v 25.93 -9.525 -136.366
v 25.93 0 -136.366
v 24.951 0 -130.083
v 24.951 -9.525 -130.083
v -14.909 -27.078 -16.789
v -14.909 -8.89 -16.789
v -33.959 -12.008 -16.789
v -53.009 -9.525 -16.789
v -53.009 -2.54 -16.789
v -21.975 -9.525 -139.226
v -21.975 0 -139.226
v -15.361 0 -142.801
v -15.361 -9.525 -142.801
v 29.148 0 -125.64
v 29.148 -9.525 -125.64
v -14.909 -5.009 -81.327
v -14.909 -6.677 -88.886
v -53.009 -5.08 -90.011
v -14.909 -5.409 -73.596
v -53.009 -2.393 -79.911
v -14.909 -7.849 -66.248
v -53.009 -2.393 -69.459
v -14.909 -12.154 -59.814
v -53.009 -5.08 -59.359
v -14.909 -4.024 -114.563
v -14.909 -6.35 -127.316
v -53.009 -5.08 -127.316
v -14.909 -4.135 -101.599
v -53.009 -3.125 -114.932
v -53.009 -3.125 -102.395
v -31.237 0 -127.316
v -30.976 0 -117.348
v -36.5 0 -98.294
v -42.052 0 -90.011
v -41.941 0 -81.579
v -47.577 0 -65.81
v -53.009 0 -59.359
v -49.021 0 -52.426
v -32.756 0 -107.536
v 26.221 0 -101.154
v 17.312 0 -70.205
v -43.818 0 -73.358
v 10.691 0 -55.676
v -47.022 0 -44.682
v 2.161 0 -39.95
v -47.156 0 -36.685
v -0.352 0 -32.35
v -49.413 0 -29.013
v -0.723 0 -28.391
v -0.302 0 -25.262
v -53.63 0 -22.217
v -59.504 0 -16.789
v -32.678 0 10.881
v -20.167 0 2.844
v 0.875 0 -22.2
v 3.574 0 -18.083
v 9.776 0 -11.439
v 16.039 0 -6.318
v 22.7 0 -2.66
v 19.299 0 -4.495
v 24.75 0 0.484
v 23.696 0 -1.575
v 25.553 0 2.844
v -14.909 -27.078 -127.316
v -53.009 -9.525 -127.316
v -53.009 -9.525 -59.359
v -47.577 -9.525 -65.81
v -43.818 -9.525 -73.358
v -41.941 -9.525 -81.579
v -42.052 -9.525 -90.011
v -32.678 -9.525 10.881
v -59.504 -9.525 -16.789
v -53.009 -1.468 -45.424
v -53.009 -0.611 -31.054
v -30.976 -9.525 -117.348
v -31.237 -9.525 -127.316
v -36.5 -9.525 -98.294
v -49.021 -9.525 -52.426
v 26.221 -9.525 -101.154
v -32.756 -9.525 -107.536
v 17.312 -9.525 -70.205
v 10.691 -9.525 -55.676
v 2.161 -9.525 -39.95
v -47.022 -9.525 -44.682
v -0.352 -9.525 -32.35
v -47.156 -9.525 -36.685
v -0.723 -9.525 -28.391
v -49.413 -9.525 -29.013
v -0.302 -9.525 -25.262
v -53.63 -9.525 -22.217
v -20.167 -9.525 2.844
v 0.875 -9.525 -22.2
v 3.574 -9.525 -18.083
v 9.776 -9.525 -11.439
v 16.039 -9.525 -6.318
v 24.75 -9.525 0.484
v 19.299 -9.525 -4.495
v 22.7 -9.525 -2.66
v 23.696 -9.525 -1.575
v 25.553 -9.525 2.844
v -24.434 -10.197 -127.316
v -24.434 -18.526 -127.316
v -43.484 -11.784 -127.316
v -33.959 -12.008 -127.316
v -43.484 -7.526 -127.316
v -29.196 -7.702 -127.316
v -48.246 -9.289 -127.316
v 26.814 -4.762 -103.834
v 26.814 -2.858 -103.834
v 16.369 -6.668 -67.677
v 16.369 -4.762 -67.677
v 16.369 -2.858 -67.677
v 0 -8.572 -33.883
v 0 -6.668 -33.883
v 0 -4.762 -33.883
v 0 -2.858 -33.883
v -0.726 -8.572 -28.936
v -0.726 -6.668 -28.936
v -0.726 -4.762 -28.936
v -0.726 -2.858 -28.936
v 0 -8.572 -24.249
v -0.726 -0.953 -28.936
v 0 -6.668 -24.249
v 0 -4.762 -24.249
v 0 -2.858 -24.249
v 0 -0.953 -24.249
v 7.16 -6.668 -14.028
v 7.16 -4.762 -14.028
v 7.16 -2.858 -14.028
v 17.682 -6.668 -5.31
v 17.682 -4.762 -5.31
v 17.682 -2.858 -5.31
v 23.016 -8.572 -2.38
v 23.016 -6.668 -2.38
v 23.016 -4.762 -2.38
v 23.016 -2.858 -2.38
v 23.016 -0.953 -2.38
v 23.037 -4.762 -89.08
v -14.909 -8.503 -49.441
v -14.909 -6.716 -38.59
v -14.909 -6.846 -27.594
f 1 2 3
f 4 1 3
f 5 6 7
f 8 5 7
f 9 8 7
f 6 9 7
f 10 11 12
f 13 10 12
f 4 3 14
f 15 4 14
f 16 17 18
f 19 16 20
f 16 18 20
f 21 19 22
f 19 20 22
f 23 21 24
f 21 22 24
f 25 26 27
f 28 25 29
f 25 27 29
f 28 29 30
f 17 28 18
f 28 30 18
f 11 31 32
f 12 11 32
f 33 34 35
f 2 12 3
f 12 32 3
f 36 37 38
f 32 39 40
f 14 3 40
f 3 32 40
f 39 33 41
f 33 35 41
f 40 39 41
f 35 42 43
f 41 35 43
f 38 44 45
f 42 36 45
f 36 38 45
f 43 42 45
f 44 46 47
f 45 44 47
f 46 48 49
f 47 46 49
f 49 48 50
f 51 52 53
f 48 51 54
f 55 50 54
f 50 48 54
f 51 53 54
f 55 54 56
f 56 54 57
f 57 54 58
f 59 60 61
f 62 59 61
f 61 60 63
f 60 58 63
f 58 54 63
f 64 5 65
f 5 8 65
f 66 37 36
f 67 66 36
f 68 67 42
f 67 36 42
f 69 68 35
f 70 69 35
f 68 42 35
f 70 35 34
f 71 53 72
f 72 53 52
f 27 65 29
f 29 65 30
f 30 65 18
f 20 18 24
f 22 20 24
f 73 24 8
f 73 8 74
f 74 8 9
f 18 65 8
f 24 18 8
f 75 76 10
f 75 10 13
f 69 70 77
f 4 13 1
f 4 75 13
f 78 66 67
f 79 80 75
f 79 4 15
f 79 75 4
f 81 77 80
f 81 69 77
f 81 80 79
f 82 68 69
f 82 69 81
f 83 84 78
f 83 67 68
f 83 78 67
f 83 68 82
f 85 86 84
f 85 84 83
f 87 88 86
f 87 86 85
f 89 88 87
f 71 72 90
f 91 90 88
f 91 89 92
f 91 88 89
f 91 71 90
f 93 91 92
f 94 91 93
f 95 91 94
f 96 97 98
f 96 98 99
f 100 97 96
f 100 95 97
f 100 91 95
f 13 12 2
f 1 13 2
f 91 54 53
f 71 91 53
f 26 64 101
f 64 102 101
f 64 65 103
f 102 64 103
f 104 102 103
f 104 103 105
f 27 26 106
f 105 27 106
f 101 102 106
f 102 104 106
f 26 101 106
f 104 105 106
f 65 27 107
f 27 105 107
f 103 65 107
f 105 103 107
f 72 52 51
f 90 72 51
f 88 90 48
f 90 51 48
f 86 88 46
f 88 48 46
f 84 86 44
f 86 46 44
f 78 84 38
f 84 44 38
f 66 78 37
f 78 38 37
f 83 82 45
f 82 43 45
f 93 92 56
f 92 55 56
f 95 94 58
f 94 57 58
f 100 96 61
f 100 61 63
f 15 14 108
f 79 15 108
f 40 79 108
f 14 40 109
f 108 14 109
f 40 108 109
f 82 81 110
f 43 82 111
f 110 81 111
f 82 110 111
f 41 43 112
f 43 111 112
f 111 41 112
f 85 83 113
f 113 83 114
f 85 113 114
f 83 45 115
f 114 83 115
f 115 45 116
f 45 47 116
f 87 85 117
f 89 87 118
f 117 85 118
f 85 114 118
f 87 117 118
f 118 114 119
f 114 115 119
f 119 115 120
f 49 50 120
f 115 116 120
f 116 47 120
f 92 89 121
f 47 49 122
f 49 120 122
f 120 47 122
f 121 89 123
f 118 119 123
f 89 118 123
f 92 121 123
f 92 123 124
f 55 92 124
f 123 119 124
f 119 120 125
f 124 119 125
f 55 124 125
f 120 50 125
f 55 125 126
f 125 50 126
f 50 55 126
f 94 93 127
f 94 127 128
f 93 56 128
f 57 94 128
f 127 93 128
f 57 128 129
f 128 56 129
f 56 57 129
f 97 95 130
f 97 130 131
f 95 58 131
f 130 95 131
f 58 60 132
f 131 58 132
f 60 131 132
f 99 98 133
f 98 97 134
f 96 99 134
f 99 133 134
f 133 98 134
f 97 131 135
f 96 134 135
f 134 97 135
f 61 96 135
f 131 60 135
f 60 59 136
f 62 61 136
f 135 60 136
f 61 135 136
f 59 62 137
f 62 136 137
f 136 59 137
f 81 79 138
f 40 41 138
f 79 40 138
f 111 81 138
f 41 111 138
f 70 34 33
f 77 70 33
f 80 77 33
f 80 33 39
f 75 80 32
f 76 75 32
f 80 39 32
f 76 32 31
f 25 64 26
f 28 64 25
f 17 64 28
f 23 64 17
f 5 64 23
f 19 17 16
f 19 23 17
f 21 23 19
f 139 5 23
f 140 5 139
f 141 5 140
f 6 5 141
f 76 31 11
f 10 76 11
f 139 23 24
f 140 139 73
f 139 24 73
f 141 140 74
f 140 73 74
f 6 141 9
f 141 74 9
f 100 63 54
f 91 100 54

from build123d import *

# Parameters (mm, degrees)
F1_DEPTH = 9.525


with BuildPart() as f1:
    # F0 (on Front) → F1 (new body)
    with BuildSketch(Plane.XZ):
        with BuildLine():
            Line((25.5529873787, 2.8441333306), (-20.1670126213, 2.8441333306))
            Line((-20.1670126213, 2.8441333306), (-32.6776243746, 10.8811762184))
            Line((-32.6776243746, 10.8811762184), (-59.5039837062, -16.7887844145))
            ThreePointArc((-59.5039837062, -16.7887844145), (-47.1561716454, -36.685361085), (-53.0086271465, -59.3589358032))
            ThreePointArc((-53.0086271465, -59.3589358032), (-43.8175889792, -73.3576679015), (-42.0523360372, -90.01070261))
            ThreePointArc((-42.0523360372, -90.01070261), (-32.7557600238, -107.5361024576), (-31.236698851, -127.3163557053))
            Line((-31.236698851, -127.3163557053), (-21.9750162214, -139.2256170511))
            Line((-21.9750162214, -139.2256170511), (-15.3611972928, -142.8006440401))
            Line((-15.3611972928, -142.8006440401), (25.9304773062, -136.3655775785))
            Line((25.9304773062, -136.3655775785), (24.9513892664, -130.0830962729))
            Line((24.9513892664, -130.0830962729), (29.148010537, -125.6404668093))
            add(Edge.make_bspline(
                [(29.148010537, -125.6404668093), (28.2946798198, -116.6393923055), (27.0527948496, -103.5397828384), (25.6464249734, -99.678769998), (17.4501539035, -65.5456126073), (6.0747879382, -48.5212865138), (-0.6953024195, -34.3483750512), (-1.2258021041, -23.7384798264), (6.8210480205, -13.805998052), (17.0170487732, -4.8279874656), (23.6734646695, -3.1092179724), (24.9350590303, 0.8868574115), (25.5529873787, 2.8441333306)],
                knots=[0, 0, 0, 0, 0.1286807075, 0.1872739764, 0.3453426722, 0.476808041, 0.5820736122, 0.6673622055, 0.7644318863, 0.8660039058, 0.9343687735, 1, 1, 1, 1], degree=3))
        make_face()
    extrude(amount=F1_DEPTH)


with BuildPart() as f6:
    # F5 (on face) → F6 section 0
    with BuildSketch(Plane.YZ.offset(-14.9086271465)):
        with BuildLine():
            ThreePointArc((-12.1535348742, -59.8138779625), (-6.7159535078, -38.5900093867), (-8.89, -16.7887844145))
            Line((-8.89, -16.7887844145), (-27.0782951266, -16.7887844145))
            Line((-27.0782951266, -16.7887844145), (-27.0782951266, -127.3163557053))
            Line((-27.0782951266, -127.3163557053), (-6.35, -127.3163557053))
            ThreePointArc((-6.35, -127.3163557053), (-3.7730338417, -108.0780656946), (-6.6773612612, -88.8864675498))
            ThreePointArc((-6.6773612612, -88.8864675498), (-5.4089924739, -73.595508424), (-12.1535348742, -59.8138779625))
        make_face()
    # F3 (on face) → F6 section 1
    with BuildSketch(Plane.YZ.offset(-53.0086271465)):
        with BuildLine():
            Line((-2.54, -16.7887844145), (-9.525, -16.7887844145))
            Line((-9.525, -16.7887844145), (-9.525, -127.3163557053))
            Line((-9.525, -127.3163557053), (-5.08, -127.3163557053))
            ThreePointArc((-5.08, -127.3163557053), (-2.8796392632, -108.6635291576), (-5.08, -90.01070261))
            ThreePointArc((-5.08, -90.01070261), (-2.0522838803, -74.6848192066), (-5.08, -59.3589358032))
            ThreePointArc((-5.08, -59.3589358032), (-0.6907278213, -38.2599752876), (-2.54, -16.7887844145))
        make_face()
    loft()


solid = Compound([f1.part, f6.part])
